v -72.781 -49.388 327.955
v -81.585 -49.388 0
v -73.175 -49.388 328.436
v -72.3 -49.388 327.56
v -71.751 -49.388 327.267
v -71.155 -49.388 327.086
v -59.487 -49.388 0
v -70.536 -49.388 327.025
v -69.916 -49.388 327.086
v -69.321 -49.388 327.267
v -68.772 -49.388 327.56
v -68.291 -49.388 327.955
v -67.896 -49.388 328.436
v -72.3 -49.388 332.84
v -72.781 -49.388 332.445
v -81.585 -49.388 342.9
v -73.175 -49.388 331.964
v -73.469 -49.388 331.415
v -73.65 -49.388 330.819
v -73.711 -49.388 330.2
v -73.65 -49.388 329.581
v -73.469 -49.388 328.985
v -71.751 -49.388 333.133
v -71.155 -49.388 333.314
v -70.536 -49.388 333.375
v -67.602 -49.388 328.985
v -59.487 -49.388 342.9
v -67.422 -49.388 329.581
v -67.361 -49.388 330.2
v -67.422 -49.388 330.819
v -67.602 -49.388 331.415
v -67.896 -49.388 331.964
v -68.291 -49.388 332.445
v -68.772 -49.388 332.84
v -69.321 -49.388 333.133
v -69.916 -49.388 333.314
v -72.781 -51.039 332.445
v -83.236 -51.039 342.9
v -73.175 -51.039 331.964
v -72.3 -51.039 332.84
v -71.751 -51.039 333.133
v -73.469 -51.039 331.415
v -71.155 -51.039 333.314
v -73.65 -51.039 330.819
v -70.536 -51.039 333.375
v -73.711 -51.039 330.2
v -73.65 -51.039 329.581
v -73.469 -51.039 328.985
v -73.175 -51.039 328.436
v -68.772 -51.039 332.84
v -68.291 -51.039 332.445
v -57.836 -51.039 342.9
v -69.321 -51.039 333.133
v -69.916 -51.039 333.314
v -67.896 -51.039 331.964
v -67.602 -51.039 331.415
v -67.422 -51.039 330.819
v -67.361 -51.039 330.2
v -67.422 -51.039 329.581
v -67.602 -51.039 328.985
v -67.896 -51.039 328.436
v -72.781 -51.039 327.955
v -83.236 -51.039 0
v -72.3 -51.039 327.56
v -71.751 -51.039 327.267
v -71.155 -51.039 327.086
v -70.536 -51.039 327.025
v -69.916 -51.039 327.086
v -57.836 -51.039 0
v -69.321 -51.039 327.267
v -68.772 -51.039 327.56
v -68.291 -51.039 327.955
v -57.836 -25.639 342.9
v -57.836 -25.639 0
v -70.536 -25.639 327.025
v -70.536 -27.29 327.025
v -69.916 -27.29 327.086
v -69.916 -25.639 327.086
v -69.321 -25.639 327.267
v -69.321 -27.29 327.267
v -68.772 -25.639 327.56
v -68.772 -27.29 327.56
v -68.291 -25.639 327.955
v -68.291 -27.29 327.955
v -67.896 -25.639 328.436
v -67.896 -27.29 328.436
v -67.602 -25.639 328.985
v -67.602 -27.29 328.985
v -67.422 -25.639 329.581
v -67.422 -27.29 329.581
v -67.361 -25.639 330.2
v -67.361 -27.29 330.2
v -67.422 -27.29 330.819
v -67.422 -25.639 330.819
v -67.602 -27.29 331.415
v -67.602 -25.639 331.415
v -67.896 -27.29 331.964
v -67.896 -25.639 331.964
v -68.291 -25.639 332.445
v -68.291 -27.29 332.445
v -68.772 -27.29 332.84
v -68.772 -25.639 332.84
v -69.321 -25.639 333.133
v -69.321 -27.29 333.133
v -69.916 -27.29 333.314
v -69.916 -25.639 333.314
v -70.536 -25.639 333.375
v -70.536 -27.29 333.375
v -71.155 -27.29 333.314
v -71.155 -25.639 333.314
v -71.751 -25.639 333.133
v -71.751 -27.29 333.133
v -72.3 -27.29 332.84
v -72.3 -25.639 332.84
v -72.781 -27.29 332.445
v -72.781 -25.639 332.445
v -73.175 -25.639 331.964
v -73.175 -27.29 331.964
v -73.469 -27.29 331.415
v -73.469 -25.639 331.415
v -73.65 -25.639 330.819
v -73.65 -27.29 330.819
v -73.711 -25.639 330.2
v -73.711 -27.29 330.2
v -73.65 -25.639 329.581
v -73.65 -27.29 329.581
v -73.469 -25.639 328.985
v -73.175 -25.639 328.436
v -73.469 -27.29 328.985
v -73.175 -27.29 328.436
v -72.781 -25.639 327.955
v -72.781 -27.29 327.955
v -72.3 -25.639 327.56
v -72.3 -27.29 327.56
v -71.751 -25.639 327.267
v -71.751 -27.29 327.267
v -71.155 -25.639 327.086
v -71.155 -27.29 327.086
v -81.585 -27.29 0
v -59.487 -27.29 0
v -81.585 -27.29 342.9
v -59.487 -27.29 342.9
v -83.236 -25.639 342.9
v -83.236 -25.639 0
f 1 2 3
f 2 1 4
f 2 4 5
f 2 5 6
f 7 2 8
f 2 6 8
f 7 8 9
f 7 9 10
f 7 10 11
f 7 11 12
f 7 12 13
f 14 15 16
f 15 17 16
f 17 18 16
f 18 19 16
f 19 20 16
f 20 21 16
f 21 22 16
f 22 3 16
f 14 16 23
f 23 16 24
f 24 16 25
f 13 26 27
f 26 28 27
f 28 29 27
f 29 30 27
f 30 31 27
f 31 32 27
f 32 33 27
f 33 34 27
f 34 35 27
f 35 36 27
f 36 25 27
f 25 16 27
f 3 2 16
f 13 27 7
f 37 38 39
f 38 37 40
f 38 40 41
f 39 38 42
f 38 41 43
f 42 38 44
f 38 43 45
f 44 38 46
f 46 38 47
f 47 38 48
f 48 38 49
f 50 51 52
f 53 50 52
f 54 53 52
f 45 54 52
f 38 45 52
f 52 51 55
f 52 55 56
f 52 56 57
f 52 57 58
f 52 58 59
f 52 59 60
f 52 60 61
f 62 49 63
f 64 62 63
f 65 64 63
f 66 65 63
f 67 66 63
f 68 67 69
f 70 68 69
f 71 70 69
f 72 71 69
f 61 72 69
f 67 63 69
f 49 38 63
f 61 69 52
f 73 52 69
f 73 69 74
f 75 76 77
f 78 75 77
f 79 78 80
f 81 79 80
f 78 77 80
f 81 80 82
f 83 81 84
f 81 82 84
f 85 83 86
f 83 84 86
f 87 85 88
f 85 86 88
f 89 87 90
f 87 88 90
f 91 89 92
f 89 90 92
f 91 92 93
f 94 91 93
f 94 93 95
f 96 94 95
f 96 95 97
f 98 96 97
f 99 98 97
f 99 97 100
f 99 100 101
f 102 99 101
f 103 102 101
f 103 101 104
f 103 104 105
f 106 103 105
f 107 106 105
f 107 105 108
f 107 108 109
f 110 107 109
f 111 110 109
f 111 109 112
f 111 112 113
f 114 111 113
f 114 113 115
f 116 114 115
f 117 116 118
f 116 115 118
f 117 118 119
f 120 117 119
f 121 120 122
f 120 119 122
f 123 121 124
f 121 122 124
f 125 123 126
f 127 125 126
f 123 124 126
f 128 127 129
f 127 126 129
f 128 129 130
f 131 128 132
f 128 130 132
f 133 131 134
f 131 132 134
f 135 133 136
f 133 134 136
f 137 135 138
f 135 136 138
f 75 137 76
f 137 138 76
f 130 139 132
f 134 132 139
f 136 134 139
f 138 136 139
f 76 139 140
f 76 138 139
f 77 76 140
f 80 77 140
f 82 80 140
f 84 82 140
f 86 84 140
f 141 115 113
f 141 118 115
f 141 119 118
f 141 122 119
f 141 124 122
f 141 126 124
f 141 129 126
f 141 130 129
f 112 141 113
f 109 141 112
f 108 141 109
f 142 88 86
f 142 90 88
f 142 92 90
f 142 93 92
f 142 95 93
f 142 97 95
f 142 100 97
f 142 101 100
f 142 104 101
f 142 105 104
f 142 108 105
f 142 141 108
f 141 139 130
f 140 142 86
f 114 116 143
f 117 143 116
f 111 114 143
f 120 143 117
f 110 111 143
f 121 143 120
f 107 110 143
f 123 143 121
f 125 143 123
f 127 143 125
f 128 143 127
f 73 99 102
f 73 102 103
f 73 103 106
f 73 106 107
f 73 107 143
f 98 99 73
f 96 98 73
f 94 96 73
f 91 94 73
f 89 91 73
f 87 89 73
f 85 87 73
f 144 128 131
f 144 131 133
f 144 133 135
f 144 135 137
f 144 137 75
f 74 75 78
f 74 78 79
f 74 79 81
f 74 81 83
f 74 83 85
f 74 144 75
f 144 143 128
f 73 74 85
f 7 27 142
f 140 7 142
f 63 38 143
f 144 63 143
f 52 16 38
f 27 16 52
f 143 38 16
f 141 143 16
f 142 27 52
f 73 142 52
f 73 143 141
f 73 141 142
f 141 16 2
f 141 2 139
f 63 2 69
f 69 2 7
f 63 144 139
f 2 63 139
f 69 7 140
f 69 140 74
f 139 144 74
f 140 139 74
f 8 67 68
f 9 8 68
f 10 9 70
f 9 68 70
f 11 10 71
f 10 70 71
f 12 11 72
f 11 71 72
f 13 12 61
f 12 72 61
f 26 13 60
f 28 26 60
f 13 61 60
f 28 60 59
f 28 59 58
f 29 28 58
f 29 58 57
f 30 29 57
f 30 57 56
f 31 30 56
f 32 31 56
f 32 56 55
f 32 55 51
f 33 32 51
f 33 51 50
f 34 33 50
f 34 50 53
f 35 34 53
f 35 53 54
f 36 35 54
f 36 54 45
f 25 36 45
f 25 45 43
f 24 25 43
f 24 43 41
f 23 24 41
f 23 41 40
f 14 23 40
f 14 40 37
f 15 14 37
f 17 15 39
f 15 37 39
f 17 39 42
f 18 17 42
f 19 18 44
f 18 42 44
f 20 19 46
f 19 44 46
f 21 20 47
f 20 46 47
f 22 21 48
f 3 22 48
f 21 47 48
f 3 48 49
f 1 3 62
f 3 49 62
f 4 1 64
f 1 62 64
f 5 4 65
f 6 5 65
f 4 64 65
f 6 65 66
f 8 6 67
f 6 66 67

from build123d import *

# Parameters (mm, degrees)
SKETCH1_W           = 25.4
SKETCH1_H           = 25.4
BOSS_EXTRUDE1_DEPTH = 342.9
SKETCH2_W           = 22.098
SKETCH2_H           = 22.098
CUT_EXTRUDE1_DEPTH  = 357.529874987
SKETCH4_R           = 3.175
CUT_EXTRUDE3_DEPTH  = 354.770733702


with BuildPart() as part:
    # Sketch1 → Boss-Extrude1 (new body)
    with BuildSketch(Plane.XY):
        with Locations((-70.535581478, -38.339002092)):
            Rectangle(SKETCH1_W, SKETCH1_H)
    extrude(amount=BOSS_EXTRUDE1_DEPTH)

    # Sketch2 → Cut-Extrude1 (cut, through all)
    with BuildSketch(Plane.XY.offset(342.9)):
        with Locations((-70.535581478, -38.339002092)):
            Rectangle(SKETCH2_W, SKETCH2_H)
    extrude(amount=-CUT_EXTRUDE1_DEPTH, mode=Mode.SUBTRACT)

    # Sketch4 → Cut-Extrude3 (cut, through all)
    with BuildSketch(Plane.XZ.offset(51.039002092)):
        with Locations(Location((-70.535581478, 330.2, 0), (0, 0, 270))):
            Circle(SKETCH4_R)
    extrude(amount=-CUT_EXTRUDE3_DEPTH, mode=Mode.SUBTRACT)


solid = part.part
